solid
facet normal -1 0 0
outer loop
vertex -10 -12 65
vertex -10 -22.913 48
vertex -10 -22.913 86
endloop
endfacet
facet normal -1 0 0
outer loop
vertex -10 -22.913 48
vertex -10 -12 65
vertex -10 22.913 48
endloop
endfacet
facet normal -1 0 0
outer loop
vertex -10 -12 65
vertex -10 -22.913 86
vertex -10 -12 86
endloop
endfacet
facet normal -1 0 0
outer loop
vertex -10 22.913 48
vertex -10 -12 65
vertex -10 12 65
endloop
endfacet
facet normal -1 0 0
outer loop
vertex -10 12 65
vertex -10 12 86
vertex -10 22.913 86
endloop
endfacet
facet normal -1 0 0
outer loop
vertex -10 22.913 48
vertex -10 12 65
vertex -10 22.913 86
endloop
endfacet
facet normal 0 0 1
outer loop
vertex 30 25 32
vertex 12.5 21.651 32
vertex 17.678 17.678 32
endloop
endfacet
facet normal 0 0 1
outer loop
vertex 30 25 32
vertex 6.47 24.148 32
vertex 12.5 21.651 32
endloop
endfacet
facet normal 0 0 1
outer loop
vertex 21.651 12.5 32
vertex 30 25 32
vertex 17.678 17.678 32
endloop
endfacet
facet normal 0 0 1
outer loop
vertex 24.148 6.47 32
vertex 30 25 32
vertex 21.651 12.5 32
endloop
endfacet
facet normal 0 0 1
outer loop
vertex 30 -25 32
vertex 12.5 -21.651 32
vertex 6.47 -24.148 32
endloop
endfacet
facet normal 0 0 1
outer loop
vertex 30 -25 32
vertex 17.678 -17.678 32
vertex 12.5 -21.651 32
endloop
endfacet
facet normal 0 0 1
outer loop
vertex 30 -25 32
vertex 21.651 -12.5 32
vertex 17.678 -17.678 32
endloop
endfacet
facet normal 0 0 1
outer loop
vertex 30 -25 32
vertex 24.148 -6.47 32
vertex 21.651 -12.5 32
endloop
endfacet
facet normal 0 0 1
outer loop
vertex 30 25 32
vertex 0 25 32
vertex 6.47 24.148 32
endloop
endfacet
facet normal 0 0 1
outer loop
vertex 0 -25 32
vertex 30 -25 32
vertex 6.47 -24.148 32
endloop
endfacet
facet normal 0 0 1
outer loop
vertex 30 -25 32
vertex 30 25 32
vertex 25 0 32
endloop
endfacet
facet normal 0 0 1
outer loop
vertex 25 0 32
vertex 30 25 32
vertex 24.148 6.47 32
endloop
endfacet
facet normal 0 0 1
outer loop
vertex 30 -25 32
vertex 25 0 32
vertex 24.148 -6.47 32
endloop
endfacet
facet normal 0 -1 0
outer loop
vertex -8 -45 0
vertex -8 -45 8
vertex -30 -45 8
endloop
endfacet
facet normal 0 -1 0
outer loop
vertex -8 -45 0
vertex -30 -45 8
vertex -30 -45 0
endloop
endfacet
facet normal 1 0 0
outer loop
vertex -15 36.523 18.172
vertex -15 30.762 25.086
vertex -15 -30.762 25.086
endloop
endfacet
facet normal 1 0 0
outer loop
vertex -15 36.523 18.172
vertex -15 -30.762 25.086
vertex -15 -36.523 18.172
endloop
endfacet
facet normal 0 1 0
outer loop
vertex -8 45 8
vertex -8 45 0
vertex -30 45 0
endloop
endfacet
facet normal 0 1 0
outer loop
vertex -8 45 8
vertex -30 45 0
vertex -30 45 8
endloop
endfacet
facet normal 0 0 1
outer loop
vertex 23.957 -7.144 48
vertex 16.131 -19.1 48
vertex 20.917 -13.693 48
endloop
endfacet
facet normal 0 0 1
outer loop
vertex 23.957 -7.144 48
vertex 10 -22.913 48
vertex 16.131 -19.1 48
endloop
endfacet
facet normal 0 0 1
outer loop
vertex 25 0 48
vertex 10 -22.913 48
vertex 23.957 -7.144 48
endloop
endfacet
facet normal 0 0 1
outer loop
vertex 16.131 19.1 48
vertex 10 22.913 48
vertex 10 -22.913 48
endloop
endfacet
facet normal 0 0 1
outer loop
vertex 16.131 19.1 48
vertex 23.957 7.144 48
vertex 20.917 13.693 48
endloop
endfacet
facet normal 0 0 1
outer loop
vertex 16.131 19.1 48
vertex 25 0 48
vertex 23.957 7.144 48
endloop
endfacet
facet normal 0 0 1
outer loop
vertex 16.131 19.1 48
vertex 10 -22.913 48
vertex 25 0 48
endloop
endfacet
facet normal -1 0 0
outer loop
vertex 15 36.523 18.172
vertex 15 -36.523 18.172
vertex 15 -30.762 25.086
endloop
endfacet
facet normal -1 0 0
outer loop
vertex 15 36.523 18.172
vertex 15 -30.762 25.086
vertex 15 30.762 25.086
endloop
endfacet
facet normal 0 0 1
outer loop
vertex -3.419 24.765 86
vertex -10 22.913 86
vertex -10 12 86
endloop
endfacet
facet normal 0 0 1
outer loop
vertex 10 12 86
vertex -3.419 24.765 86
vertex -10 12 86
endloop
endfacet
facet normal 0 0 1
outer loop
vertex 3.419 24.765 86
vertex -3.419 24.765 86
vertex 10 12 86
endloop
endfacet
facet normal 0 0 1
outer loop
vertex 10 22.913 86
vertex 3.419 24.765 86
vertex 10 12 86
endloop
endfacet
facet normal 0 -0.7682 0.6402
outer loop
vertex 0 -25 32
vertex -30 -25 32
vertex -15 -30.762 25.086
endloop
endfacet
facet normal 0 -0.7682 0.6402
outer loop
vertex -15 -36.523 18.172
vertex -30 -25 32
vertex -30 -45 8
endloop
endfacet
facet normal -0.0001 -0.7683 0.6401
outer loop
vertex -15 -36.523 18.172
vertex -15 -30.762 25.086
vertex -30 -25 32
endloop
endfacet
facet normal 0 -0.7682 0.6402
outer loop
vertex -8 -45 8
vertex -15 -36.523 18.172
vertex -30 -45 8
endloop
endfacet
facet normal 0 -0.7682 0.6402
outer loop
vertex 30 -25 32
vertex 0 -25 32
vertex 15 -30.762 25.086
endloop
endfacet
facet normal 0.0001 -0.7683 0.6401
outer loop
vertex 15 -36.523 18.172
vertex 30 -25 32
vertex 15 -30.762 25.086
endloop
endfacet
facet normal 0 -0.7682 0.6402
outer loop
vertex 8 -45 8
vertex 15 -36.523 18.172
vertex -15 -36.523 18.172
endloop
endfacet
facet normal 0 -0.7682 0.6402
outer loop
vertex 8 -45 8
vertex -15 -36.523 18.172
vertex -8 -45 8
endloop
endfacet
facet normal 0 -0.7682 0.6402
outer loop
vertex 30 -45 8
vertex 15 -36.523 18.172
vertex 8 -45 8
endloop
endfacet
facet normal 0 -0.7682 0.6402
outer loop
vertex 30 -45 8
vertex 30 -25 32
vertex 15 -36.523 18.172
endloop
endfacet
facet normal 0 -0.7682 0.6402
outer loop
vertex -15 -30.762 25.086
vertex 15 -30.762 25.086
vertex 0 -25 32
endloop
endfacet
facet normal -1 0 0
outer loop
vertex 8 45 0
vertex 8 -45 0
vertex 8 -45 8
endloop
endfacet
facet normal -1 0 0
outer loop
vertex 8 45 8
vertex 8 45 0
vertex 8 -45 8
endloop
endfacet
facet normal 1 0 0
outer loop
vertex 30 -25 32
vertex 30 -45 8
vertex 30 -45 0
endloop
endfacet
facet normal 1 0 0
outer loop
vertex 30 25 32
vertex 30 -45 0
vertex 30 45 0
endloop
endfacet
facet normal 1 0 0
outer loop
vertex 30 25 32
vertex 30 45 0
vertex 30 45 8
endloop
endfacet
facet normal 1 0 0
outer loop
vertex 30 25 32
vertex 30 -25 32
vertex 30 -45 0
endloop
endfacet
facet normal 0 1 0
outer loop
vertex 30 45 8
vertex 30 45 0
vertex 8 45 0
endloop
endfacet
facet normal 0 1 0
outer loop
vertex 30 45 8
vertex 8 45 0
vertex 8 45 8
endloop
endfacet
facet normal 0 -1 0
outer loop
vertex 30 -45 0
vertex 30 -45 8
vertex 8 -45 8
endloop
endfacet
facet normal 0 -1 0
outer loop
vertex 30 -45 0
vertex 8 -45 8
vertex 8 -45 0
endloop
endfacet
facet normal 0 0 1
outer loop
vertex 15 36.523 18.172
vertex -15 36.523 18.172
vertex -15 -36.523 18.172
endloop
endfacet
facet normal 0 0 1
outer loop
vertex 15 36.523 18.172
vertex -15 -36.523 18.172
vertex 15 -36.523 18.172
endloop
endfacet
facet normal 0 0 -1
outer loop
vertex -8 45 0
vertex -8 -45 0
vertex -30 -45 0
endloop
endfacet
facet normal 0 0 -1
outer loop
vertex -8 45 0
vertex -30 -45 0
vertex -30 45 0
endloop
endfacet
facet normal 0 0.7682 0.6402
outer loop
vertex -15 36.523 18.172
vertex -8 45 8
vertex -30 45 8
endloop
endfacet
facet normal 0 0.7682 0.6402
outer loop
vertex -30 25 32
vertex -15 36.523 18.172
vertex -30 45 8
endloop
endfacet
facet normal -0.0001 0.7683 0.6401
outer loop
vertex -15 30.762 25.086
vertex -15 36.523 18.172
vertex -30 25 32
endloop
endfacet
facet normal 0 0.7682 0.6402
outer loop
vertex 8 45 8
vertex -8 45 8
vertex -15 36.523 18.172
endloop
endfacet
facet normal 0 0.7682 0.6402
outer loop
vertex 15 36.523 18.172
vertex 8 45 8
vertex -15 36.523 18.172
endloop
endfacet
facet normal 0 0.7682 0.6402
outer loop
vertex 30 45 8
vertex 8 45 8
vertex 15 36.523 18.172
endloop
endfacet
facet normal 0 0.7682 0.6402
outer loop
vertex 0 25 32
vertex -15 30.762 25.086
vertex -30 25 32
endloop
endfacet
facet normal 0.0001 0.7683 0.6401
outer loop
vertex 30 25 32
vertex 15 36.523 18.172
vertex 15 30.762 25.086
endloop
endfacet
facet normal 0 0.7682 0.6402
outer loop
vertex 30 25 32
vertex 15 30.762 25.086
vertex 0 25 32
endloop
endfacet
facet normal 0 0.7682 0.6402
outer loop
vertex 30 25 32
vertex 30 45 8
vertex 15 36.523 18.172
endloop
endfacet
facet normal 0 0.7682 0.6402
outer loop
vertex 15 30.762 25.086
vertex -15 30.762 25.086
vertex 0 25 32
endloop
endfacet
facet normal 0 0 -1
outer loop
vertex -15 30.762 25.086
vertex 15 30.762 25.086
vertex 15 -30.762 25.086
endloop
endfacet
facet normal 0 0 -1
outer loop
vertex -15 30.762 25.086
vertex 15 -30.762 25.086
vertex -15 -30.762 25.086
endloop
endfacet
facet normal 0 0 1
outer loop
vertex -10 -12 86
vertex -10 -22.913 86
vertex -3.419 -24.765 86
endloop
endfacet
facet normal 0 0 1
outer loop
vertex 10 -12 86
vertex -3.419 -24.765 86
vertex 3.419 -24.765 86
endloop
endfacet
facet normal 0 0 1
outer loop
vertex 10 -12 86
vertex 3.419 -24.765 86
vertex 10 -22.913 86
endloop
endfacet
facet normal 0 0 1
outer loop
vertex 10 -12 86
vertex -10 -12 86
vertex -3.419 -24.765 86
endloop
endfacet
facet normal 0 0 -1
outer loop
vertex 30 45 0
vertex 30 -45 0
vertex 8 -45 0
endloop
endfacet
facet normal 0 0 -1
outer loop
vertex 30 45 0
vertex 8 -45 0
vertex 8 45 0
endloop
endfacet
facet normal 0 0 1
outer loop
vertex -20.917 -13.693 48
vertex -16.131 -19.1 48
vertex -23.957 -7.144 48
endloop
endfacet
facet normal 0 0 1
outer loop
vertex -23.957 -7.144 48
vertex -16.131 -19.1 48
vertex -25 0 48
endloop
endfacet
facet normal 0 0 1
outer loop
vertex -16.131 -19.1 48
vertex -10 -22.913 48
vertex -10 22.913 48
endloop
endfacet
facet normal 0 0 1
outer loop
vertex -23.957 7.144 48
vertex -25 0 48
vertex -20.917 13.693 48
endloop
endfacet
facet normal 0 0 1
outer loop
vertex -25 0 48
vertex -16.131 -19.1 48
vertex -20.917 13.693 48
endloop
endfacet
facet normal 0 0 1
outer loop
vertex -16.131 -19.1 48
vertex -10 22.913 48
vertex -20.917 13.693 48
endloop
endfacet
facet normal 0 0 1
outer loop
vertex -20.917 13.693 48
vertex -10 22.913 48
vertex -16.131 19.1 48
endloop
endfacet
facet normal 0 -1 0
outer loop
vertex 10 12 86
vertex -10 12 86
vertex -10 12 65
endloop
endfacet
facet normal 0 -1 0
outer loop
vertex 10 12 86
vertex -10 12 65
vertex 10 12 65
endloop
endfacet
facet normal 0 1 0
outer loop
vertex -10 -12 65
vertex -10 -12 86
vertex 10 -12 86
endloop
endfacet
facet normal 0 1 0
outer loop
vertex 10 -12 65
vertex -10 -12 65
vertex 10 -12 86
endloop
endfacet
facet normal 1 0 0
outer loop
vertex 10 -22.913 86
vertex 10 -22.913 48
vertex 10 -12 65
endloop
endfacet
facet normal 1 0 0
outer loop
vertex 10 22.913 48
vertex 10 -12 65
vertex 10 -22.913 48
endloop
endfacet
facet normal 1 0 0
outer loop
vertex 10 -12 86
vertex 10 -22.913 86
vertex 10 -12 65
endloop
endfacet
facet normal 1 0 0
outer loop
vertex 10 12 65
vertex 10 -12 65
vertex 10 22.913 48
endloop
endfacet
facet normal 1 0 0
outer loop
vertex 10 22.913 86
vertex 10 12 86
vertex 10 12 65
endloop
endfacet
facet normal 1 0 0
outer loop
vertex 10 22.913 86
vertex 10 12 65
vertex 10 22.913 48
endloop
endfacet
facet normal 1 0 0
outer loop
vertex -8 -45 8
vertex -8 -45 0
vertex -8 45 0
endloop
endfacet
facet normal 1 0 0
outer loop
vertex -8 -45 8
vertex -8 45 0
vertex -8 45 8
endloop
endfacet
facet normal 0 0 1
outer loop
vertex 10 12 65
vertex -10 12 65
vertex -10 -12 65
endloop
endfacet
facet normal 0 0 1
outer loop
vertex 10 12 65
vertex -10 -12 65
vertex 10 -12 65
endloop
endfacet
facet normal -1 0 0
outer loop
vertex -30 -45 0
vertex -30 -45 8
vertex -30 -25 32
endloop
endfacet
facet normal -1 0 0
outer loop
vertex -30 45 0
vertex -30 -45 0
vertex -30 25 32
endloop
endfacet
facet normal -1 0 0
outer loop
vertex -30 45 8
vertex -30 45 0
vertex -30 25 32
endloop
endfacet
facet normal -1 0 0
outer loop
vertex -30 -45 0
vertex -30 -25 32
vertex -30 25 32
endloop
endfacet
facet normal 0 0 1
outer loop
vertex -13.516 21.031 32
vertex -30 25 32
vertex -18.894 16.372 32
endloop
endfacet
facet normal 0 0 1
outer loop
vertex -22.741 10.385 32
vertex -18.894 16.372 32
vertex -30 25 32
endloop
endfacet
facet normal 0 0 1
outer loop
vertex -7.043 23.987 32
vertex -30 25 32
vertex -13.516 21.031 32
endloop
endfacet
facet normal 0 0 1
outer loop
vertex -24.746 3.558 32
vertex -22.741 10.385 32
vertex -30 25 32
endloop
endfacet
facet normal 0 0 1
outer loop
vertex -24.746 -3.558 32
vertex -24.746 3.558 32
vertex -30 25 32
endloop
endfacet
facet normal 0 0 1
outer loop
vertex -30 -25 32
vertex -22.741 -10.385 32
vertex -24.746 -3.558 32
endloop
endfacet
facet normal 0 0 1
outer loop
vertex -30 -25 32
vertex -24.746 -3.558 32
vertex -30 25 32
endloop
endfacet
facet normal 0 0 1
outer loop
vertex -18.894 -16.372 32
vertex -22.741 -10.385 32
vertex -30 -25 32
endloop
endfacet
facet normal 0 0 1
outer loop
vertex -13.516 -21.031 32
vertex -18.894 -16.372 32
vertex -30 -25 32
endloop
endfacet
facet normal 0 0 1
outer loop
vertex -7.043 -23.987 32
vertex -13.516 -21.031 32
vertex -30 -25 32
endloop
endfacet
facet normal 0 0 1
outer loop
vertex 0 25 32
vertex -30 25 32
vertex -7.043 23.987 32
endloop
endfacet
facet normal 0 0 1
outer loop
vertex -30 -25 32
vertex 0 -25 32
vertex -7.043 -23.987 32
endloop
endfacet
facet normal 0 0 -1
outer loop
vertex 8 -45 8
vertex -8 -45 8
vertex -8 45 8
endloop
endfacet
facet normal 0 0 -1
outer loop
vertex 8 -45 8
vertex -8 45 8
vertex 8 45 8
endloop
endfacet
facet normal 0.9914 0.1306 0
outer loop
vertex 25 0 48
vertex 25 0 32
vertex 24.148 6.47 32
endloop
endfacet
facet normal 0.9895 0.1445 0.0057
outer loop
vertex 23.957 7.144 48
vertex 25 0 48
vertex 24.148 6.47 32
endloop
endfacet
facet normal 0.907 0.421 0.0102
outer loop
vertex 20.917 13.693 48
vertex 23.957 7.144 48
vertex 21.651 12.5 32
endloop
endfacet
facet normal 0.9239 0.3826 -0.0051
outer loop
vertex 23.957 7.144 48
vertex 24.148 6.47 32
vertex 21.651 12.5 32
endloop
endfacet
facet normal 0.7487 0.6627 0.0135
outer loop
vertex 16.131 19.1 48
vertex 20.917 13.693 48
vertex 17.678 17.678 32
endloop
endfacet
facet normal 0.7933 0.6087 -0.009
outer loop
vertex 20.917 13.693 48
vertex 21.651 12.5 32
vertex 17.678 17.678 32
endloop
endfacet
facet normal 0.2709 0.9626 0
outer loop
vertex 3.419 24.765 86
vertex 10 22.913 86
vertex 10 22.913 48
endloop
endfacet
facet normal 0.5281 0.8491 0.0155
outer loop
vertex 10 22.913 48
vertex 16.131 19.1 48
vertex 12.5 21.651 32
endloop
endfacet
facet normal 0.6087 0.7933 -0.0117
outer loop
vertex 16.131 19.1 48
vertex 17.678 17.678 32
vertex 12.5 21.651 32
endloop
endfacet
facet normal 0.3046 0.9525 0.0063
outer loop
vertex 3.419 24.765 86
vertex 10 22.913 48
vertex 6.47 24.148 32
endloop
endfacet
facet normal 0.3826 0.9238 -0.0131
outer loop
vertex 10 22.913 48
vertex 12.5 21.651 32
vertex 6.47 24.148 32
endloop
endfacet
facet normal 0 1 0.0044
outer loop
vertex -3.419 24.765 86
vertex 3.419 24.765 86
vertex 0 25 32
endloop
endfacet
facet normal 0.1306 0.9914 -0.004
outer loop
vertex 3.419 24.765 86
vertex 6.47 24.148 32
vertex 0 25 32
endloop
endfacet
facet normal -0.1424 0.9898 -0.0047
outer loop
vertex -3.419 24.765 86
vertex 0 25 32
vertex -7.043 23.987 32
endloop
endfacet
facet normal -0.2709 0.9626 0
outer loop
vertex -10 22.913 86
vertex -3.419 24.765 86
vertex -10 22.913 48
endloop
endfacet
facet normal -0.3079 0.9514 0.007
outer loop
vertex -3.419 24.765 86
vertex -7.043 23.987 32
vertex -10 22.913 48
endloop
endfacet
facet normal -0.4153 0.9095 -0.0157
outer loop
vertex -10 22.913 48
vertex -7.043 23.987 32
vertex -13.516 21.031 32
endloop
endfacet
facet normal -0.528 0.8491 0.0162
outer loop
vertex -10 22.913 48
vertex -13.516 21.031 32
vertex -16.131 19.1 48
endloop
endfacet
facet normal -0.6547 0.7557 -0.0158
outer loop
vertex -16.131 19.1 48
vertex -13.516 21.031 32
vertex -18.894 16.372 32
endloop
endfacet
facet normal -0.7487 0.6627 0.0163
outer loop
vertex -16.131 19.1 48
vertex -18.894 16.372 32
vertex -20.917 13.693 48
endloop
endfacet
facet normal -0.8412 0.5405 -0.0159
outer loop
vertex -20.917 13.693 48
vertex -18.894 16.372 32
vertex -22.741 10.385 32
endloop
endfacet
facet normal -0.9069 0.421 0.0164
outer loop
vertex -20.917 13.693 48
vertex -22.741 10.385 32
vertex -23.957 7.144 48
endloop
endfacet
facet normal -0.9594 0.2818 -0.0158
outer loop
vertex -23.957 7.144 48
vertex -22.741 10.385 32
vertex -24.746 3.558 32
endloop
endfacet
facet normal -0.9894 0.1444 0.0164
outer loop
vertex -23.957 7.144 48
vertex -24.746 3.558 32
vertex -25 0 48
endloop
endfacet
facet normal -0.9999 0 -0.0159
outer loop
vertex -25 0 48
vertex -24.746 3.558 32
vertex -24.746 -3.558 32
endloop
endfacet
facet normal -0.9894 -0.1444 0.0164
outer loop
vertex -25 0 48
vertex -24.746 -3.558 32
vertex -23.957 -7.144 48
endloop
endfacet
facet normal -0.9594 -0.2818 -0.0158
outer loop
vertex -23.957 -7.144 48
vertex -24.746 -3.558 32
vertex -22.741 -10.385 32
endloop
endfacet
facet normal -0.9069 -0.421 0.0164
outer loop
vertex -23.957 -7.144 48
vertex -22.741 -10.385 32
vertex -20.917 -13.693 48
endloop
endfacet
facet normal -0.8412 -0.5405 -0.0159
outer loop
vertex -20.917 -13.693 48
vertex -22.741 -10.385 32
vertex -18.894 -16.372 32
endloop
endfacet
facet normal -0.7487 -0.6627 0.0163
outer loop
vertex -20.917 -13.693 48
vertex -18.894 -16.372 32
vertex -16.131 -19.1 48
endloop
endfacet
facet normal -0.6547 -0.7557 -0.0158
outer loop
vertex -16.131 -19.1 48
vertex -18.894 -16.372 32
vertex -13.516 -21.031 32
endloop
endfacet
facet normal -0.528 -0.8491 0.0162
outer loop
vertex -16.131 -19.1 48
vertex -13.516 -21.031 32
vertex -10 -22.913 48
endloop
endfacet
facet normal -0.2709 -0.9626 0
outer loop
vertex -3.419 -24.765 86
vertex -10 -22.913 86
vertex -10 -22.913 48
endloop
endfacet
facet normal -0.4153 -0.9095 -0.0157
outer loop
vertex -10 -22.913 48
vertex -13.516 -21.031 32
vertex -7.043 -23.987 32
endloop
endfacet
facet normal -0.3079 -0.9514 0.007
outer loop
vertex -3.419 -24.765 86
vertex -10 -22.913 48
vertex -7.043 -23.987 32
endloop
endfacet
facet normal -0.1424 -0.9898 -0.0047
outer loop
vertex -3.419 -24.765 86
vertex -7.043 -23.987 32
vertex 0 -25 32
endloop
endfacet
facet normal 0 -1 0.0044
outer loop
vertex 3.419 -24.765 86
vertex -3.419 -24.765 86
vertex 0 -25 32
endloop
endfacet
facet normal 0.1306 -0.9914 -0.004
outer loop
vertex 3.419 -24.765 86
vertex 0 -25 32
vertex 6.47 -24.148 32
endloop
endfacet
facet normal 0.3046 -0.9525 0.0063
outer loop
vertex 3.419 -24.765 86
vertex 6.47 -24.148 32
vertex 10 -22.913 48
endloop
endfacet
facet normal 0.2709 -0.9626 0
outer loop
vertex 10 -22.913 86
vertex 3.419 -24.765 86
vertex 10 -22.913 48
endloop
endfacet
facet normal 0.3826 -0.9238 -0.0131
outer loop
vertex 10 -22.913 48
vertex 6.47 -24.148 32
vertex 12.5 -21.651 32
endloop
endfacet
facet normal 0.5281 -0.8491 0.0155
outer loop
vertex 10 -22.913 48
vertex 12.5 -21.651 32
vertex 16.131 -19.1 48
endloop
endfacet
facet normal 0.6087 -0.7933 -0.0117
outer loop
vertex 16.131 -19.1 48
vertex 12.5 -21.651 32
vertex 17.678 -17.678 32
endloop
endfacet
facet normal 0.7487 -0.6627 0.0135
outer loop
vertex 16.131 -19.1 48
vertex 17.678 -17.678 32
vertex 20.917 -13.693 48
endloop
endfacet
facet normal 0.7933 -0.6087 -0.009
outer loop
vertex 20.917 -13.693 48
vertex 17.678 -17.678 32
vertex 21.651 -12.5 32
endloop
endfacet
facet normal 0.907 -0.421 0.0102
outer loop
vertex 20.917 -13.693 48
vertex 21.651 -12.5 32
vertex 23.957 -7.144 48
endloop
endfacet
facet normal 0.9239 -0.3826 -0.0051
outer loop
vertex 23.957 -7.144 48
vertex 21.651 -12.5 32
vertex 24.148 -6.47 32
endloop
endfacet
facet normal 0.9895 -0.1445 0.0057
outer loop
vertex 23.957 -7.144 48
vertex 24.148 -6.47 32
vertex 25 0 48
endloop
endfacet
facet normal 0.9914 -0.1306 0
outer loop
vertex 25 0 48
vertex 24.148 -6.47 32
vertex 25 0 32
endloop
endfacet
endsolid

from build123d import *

# Parameters (mm, degrees)
F1_DEPTH  = 30
F2_R      = 25
F3_DEPTH  = 54
F4_W      = 50
F4_H      = 24
F5_DEPTH  = 21
F6_W      = 25
F6_H      = 50
F7_DEPTH  = 38
F8_W      = 30
F8_H      = 9
F11_W     = 16
F11_H     = 8
F12_DEPTH = 90.001


# Not quite as in the source:
# - a pattern or mirror of a feature is missing from the dataset's text; its kind, count and spacing are read off the source's solid


with BuildPart() as f1:
    # F0 (on Right) → F1 (new body, symmetric)
    with BuildSketch(Plane.YZ):
        Polygon((-45, 0), (0, 0), (45, 0), (45, 8), (25, 32), (0, 32), (-25, 32), (-45, 8), align=None)
    extrude(amount=F1_DEPTH, both=True)

    # F2 (on face) → F3 (join)
    with BuildSketch(Plane.XY.offset(32)):
        Circle(F2_R)
    extrude(amount=F3_DEPTH)

    # F4 (on face) → F5 (cut)
    with BuildSketch(Plane.XY.offset(86)):
        Rectangle(F4_W, F4_H)
    extrude(amount=-F5_DEPTH, mode=Mode.SUBTRACT)

    # F6 (on face) → F7 (cut)
    with BuildSketch(Plane.XY.offset(86)):
        with Locations((22.5, 0)):
            Rectangle(F6_W, F6_H)
    f7 = extrude(amount=-F7_DEPTH, mode=Mode.SUBTRACT)

    # F7_copies: F7 across plane
    add(f7.mirror(Plane(origin=(0, 0, 0), x_dir=(0, 0, -1), z_dir=(-1, 0, 0))), mode=Mode.SUBTRACT)

    # F10: sweep along a path in F9
    with BuildLine(Plane.YZ.offset(30)) as f10_path:
        Line((-35, 20), (51.1633306742, 20))
    # F8 (on face) → F10 (sweep, cut)
    with BuildSketch(Plane(origin=(0, -30.4918032787, 25.4098360656), x_dir=(1, 0, 0), z_dir=(0, -0.7682212796, 0.6401843997))):
        with Locations((0, -4.9215290445)):
            Rectangle(F8_W, F8_H)
    sweep(path=f10_path.line, mode=Mode.SUBTRACT)

    # F11 (on face) → F12 (cut, through all)
    with BuildSketch(Plane.XZ.offset(45)):
        with Locations((0, 4)):
            Rectangle(F11_W, F11_H)
    extrude(amount=-F12_DEPTH, mode=Mode.SUBTRACT)


solid = f1.part
